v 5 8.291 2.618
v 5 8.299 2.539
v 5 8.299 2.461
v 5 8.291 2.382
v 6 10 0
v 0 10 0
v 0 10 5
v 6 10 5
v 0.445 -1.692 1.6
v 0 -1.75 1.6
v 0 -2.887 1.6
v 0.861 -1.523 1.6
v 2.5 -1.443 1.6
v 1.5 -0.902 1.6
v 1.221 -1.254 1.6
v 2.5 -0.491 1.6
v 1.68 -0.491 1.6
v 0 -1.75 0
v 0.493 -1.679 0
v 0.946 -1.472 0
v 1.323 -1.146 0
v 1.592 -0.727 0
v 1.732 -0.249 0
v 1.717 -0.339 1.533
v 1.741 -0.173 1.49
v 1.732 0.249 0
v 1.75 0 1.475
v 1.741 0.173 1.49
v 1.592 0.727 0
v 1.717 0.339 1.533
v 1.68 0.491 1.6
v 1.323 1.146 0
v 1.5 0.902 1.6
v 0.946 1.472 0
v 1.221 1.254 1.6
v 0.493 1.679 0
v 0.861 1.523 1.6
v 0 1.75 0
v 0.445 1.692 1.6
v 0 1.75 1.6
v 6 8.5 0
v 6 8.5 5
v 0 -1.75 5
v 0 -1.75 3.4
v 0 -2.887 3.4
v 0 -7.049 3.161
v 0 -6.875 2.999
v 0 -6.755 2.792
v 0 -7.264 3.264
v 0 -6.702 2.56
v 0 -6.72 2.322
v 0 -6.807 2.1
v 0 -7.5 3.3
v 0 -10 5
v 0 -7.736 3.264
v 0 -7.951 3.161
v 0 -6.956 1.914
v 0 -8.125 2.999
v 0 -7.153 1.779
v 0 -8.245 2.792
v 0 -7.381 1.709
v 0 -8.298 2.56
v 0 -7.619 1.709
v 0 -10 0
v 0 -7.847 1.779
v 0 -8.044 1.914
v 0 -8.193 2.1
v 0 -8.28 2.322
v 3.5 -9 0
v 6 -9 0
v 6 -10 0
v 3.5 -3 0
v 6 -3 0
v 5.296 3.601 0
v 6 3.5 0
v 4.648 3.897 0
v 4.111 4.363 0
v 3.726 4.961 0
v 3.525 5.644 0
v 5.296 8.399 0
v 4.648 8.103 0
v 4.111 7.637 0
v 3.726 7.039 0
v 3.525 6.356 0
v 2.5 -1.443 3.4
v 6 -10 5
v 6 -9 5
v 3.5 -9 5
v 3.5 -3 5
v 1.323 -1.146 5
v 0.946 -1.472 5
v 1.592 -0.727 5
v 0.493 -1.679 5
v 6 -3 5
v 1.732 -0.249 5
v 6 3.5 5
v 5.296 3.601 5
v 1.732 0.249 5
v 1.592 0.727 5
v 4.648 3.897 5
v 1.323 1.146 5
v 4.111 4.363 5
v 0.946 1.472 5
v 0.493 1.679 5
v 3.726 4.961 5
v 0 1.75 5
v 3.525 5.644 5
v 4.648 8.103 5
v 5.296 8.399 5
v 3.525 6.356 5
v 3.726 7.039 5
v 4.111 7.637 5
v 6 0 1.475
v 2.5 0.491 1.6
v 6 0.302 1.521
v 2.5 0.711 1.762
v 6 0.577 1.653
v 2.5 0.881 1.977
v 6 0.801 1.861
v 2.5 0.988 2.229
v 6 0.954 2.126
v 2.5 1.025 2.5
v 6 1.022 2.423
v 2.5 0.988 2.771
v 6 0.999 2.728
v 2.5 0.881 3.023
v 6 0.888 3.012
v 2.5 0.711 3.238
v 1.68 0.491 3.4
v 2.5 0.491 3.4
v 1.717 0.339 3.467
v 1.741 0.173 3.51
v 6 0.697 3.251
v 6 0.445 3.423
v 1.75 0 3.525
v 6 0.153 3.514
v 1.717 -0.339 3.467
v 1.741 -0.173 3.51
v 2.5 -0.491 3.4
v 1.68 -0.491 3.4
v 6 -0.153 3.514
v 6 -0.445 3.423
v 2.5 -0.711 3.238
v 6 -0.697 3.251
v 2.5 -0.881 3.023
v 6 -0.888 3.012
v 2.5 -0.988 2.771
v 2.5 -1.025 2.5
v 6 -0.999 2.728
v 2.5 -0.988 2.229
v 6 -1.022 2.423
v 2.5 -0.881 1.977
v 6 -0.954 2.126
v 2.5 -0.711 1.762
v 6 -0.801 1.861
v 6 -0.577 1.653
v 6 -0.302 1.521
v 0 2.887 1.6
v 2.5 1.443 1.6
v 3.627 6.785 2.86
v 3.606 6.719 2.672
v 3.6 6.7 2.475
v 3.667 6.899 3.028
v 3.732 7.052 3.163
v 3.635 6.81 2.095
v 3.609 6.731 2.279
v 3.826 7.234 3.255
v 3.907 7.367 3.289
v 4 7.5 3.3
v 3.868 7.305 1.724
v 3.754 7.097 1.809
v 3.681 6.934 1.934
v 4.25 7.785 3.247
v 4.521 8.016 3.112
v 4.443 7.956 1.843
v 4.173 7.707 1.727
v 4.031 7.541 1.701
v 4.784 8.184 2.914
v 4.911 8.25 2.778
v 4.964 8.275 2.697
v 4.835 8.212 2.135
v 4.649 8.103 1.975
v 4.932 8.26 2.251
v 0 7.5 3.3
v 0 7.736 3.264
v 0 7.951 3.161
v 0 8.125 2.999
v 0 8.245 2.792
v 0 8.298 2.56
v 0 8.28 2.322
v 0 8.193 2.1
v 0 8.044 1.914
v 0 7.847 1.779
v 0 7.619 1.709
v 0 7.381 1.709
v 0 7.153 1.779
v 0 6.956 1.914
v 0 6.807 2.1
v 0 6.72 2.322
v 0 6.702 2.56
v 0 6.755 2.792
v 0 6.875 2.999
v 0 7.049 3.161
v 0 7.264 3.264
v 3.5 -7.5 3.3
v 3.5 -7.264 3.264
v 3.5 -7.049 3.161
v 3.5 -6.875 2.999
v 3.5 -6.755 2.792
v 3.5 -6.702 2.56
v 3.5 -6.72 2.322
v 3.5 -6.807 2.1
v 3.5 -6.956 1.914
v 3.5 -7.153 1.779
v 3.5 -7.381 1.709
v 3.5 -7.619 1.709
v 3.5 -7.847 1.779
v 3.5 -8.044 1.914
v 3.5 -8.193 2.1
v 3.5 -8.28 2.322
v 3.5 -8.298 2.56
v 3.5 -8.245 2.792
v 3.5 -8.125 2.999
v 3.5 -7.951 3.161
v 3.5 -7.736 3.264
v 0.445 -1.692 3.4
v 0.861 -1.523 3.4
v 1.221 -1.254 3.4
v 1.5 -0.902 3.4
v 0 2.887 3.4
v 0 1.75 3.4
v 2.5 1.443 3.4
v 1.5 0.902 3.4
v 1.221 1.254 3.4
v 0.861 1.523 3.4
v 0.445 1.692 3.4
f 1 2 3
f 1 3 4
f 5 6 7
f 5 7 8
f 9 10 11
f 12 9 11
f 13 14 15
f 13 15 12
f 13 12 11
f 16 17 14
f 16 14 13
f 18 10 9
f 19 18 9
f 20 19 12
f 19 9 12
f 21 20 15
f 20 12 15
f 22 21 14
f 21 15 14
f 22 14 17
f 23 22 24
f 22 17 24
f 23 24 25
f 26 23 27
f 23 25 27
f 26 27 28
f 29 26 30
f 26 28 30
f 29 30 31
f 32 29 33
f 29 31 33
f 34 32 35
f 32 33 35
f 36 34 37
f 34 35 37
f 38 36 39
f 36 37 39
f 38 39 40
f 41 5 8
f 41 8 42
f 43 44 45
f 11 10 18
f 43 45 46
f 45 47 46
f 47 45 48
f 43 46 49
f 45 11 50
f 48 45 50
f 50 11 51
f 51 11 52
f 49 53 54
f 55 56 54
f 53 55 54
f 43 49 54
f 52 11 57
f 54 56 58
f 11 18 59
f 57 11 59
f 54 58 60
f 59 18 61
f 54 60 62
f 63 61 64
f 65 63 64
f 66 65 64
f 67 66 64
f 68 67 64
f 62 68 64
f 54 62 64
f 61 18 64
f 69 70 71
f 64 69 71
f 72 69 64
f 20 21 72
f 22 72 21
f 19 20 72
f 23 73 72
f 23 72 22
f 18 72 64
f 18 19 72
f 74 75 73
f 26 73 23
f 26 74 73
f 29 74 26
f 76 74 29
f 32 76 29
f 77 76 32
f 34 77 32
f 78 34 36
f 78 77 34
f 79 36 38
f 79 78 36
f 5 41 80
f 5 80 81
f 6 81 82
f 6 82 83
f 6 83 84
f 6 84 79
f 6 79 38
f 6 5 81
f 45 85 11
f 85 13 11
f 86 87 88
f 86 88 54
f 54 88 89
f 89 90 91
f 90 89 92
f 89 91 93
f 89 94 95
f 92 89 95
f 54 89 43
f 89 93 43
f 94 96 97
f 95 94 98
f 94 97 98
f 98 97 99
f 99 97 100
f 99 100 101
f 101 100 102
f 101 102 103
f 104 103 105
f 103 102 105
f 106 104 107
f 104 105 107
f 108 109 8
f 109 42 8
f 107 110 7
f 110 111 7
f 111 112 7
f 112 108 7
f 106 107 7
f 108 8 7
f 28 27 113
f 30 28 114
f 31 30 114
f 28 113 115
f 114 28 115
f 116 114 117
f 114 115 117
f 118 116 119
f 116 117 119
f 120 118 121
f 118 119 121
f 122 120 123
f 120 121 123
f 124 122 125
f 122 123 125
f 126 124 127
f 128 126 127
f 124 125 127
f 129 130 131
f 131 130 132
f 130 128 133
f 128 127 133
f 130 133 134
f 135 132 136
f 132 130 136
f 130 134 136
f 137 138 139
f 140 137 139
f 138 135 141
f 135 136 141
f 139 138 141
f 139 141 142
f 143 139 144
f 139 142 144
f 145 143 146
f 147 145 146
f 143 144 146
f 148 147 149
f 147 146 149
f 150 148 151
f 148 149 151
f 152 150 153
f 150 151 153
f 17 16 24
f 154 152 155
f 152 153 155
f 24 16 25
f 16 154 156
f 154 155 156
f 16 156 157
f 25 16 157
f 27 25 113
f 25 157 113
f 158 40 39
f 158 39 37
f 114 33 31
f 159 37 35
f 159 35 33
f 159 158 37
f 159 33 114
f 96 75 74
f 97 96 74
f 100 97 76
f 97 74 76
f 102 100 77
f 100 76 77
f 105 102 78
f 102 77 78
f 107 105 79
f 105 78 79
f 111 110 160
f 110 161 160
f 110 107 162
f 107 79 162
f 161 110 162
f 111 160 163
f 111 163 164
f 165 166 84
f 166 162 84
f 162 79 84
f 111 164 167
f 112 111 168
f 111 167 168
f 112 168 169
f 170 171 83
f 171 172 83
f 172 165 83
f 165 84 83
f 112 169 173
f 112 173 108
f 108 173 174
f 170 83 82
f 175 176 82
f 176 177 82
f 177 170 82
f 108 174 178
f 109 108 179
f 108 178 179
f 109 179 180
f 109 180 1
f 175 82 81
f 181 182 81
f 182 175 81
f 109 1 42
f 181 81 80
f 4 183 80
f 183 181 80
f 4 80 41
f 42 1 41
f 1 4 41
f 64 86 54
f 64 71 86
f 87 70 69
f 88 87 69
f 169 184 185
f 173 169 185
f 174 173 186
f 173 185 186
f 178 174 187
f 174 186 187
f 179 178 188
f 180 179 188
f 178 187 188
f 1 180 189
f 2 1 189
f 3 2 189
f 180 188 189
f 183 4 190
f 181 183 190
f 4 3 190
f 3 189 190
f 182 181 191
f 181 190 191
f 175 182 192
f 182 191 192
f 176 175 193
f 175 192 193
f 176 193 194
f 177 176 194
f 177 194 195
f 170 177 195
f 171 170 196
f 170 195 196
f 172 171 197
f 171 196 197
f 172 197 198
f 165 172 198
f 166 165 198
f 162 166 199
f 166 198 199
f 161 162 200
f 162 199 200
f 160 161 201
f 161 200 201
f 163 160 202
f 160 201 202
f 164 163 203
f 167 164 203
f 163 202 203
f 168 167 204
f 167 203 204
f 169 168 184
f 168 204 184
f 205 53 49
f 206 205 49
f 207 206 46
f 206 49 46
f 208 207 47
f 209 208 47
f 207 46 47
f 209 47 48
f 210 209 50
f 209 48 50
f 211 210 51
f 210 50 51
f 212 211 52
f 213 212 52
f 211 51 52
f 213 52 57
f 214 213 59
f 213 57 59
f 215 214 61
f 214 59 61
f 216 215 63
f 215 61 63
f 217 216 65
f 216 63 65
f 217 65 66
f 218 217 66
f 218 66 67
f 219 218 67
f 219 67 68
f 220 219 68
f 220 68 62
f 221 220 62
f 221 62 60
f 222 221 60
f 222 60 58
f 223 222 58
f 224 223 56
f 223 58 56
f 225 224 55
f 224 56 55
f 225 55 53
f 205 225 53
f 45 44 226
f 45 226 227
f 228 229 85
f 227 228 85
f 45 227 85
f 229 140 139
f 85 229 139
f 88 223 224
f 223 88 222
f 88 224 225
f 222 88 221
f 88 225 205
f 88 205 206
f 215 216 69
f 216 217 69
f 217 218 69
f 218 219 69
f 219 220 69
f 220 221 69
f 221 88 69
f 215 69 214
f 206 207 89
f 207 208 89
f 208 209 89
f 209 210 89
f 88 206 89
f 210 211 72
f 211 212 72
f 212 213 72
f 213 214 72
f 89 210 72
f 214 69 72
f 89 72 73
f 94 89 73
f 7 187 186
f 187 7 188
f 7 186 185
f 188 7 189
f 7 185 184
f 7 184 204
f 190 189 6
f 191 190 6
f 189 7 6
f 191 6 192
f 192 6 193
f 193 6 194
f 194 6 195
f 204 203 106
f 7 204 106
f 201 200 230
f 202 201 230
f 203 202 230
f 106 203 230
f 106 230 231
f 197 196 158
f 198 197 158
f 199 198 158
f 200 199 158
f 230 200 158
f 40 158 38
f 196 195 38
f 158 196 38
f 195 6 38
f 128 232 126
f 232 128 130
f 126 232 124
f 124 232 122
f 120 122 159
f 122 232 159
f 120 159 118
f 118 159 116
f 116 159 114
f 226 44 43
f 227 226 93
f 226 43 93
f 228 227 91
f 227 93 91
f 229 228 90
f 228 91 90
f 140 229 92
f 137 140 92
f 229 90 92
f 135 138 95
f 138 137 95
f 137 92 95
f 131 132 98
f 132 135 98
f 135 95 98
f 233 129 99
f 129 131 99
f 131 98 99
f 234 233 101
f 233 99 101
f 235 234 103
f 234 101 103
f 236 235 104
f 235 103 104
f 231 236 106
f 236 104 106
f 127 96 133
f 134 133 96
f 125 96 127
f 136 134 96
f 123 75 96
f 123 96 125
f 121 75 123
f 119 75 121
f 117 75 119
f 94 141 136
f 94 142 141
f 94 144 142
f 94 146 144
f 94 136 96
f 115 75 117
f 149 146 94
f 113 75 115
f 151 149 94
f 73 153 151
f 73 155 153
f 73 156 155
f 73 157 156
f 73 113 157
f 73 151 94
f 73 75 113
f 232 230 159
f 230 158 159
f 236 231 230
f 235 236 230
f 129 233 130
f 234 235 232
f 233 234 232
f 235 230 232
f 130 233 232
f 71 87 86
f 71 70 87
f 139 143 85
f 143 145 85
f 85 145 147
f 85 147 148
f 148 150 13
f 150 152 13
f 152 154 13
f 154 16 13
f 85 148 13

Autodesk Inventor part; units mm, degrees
ref_plane "YZ Plane" through (0, 0, 0) normal (1, 0, 0) x (0, 1, 0)
ref_plane "XZ Plane" through (0, 0, 0) normal (0, 1, 0) x (-1, 0, 0)
ref_plane "XY Plane" through (0, 0, 0) normal (0, 0, 1) x (1, 0, 0)
sketch "Sketch1" plane through (0, 0, 0) normal (0, 0, 1) x (1, 0, 0)
  line L0 (10, -10) -> (-10, -10)
  line L1 (-10, -10) -> (-10, 10)
  line L2 (-10, 10) -> (10, 10)
  line L3 (10, 10) -> (10, -10)
  line L4 (10, -10) -> (-10, 10) construction
  line L5 (-10, -10) -> (10, 10) construction
  line L6 (10, -10) -> (6, -10)
  line L7 (6, -10) -> (6, 10)
  line L8 (6, 10) -> (10, 10)
  line L9 (10, 10) -> (10, -10)
  line L10 (6, 2) -> (4, 2)
  line L11 (4, 2) -> (4, -2)
  line L12 (4, -2) -> (6, -2)
  line L13 (6, -2) -> (6, 2)
  line L14 (0, 10) -> (0, -10)
  point P0 (0, 0)
  dimension "d0" = 20
  dimension "d1" = 20
  dimension "d2" = 4
  dimension "d6" = 2
  dimension "d7" = 2
  dimension "d8" = 4
  dimension "d9" = 2
  dimension "d44" = 6
extrude "Extrusion1" add sketch "Sketch1" along normal blind 5 contours L0 L14 L2 L7 L10 L11 L12
ref_plane "Work Plane1" through (0, 0, 2.5) normal (0, 0, 1) x (1, 0, 0)
sketch "Sketch2" plane through (0, 0, 2.5) normal (0, 0, 1) x (1, 0, 0)
  line L0 (0, 10) -> (0, -10) projected
  line L1 (0, 2.8868) -> (2.5, 1.4434)
  line L2 (2.5, 1.4434) -> (2.5, -1.4434)
  line L3 (2.5, -1.4434) -> (0, -2.8868)
  line L4 (0, -2.8868) -> (-2.5, -1.4434)
  line L5 (-2.5, -1.4434) -> (-2.5, 1.4434)
  line L6 (-2.5, 1.4434) -> (0, 2.8868)
  point P0 (0, 0)
  point P1 (0, 0)
  dimension "d12" = 5
extrude "Extrusion2" cut sketch "Sketch2" along normal mid plane 1.8
sketch "Sketch3" plane through (0, 0, 5) normal (0, 0, 1) x (1, 0, 0)
  circle A0 centre (0, 0) radius 1.75
  dimension "d15" = 3.5
extrude "Extrusion3" cut sketch "Sketch3" against normal blind 8
sketch "Sketch4" plane through (0, 10, 0) normal (-1, 0, 0) x (0, 0, 1)
  circle A0 centre (2.5, -2.5) radius 0.8
  circle A1 centre (2.5, -17.5) radius 0.8
  line L0 (0, 0) -> (5, 0) projected
  line L1 (0, 0) -> (0, -8.25) projected
  line L2 (0, -11.75) -> (0, -20) projected
  line L3 (0, -20) -> (5, -20) projected
  point P0 (0, -10)
  dimension "d18" = 1.6
  dimension "d19" = 1.6
  dimension "d20" = 2.5
  dimension "d21" = 2.5
  dimension "d22" = 2.5
  dimension "d23" = 2.5
extrude "Extrusion4" cut sketch "Sketch4" against normal blind 5
thread "Thread1" size "M2x0.4" class "6H" standard "ANSI Metric M Profile" full length
thread "Thread2" size "M2x0.4" class "6H" standard "ANSI Metric M Profile" full length
sketch "Sketch5" plane through (0, 0, 0) normal (0, 0, -1) x (-1, 0, 0)
  line L0 (-4, -2) -> (-4, 2) projected
  line L1 (-6, -10) -> (-6, -2) projected
  line L2 (-4, 2) -> (-6, 2)
  line L3 (-6, 2) -> (-6, -2)
  line L4 (-6, -2) -> (-4, -2)
  line L5 (-4, -2) -> (-4, 2)
  point P0 (0, 0)
extrude "Extrusion5" add sketch "Sketch5" against normal blind 5
sketch "Sketch6" plane through (0, 0, 0) normal (0, 0, -1) x (-1, 0, 0)
  line L0 (-6, -10) -> (-6, 10) projected
  circle A0 centre (-6, 6) radius 2.5
  line L1 (-6, -9) -> (-3.5, -9)
  line L2 (-3.5, -9) -> (-3.5, -3)
  line L3 (-3.5, -3) -> (-6, -3)
  line L4 (-6, -3) -> (-6, -9)
  line L5 (0, -10) -> (-6, -10) projected
  line L6 (-6, 10) -> (0, 10) projected
  point P0 (0, 0)
  point P1 (-6, 8.5)
  point P2 (-6, 3.5)
  dimension "d32" = 2.5
  dimension "d33" = 1
  dimension "d34" = 6
  dimension "d35" = 5
  dimension "d36" = 4
extrude "Extrusion6" cut sketch "Sketch6" against normal blind 5 contours L0 A0 | L0 L3 L2 L1 picked at (-5.3485, 6.5196)
sketch "Sketch7" plane through (6, -3, 0) normal (1, 0, 0) x (0, 0, -1)
  circle A0 centre (-2.5, 3) radius 1.025
  line L0 (-5, 0) -> (-5, 6.5) projected
  line L1 (0, -7) -> (-5, -7) projected
  point P0 (0, 3)
  dimension "d39" = 2.5
  dimension "d40" = 10
  dimension "d41" = 2.05
extrude "Extrusion7" cut sketch "Sketch7" against normal blind 12
equation "\"d19\" = d18"
properties part number "POMSliderMotor"
